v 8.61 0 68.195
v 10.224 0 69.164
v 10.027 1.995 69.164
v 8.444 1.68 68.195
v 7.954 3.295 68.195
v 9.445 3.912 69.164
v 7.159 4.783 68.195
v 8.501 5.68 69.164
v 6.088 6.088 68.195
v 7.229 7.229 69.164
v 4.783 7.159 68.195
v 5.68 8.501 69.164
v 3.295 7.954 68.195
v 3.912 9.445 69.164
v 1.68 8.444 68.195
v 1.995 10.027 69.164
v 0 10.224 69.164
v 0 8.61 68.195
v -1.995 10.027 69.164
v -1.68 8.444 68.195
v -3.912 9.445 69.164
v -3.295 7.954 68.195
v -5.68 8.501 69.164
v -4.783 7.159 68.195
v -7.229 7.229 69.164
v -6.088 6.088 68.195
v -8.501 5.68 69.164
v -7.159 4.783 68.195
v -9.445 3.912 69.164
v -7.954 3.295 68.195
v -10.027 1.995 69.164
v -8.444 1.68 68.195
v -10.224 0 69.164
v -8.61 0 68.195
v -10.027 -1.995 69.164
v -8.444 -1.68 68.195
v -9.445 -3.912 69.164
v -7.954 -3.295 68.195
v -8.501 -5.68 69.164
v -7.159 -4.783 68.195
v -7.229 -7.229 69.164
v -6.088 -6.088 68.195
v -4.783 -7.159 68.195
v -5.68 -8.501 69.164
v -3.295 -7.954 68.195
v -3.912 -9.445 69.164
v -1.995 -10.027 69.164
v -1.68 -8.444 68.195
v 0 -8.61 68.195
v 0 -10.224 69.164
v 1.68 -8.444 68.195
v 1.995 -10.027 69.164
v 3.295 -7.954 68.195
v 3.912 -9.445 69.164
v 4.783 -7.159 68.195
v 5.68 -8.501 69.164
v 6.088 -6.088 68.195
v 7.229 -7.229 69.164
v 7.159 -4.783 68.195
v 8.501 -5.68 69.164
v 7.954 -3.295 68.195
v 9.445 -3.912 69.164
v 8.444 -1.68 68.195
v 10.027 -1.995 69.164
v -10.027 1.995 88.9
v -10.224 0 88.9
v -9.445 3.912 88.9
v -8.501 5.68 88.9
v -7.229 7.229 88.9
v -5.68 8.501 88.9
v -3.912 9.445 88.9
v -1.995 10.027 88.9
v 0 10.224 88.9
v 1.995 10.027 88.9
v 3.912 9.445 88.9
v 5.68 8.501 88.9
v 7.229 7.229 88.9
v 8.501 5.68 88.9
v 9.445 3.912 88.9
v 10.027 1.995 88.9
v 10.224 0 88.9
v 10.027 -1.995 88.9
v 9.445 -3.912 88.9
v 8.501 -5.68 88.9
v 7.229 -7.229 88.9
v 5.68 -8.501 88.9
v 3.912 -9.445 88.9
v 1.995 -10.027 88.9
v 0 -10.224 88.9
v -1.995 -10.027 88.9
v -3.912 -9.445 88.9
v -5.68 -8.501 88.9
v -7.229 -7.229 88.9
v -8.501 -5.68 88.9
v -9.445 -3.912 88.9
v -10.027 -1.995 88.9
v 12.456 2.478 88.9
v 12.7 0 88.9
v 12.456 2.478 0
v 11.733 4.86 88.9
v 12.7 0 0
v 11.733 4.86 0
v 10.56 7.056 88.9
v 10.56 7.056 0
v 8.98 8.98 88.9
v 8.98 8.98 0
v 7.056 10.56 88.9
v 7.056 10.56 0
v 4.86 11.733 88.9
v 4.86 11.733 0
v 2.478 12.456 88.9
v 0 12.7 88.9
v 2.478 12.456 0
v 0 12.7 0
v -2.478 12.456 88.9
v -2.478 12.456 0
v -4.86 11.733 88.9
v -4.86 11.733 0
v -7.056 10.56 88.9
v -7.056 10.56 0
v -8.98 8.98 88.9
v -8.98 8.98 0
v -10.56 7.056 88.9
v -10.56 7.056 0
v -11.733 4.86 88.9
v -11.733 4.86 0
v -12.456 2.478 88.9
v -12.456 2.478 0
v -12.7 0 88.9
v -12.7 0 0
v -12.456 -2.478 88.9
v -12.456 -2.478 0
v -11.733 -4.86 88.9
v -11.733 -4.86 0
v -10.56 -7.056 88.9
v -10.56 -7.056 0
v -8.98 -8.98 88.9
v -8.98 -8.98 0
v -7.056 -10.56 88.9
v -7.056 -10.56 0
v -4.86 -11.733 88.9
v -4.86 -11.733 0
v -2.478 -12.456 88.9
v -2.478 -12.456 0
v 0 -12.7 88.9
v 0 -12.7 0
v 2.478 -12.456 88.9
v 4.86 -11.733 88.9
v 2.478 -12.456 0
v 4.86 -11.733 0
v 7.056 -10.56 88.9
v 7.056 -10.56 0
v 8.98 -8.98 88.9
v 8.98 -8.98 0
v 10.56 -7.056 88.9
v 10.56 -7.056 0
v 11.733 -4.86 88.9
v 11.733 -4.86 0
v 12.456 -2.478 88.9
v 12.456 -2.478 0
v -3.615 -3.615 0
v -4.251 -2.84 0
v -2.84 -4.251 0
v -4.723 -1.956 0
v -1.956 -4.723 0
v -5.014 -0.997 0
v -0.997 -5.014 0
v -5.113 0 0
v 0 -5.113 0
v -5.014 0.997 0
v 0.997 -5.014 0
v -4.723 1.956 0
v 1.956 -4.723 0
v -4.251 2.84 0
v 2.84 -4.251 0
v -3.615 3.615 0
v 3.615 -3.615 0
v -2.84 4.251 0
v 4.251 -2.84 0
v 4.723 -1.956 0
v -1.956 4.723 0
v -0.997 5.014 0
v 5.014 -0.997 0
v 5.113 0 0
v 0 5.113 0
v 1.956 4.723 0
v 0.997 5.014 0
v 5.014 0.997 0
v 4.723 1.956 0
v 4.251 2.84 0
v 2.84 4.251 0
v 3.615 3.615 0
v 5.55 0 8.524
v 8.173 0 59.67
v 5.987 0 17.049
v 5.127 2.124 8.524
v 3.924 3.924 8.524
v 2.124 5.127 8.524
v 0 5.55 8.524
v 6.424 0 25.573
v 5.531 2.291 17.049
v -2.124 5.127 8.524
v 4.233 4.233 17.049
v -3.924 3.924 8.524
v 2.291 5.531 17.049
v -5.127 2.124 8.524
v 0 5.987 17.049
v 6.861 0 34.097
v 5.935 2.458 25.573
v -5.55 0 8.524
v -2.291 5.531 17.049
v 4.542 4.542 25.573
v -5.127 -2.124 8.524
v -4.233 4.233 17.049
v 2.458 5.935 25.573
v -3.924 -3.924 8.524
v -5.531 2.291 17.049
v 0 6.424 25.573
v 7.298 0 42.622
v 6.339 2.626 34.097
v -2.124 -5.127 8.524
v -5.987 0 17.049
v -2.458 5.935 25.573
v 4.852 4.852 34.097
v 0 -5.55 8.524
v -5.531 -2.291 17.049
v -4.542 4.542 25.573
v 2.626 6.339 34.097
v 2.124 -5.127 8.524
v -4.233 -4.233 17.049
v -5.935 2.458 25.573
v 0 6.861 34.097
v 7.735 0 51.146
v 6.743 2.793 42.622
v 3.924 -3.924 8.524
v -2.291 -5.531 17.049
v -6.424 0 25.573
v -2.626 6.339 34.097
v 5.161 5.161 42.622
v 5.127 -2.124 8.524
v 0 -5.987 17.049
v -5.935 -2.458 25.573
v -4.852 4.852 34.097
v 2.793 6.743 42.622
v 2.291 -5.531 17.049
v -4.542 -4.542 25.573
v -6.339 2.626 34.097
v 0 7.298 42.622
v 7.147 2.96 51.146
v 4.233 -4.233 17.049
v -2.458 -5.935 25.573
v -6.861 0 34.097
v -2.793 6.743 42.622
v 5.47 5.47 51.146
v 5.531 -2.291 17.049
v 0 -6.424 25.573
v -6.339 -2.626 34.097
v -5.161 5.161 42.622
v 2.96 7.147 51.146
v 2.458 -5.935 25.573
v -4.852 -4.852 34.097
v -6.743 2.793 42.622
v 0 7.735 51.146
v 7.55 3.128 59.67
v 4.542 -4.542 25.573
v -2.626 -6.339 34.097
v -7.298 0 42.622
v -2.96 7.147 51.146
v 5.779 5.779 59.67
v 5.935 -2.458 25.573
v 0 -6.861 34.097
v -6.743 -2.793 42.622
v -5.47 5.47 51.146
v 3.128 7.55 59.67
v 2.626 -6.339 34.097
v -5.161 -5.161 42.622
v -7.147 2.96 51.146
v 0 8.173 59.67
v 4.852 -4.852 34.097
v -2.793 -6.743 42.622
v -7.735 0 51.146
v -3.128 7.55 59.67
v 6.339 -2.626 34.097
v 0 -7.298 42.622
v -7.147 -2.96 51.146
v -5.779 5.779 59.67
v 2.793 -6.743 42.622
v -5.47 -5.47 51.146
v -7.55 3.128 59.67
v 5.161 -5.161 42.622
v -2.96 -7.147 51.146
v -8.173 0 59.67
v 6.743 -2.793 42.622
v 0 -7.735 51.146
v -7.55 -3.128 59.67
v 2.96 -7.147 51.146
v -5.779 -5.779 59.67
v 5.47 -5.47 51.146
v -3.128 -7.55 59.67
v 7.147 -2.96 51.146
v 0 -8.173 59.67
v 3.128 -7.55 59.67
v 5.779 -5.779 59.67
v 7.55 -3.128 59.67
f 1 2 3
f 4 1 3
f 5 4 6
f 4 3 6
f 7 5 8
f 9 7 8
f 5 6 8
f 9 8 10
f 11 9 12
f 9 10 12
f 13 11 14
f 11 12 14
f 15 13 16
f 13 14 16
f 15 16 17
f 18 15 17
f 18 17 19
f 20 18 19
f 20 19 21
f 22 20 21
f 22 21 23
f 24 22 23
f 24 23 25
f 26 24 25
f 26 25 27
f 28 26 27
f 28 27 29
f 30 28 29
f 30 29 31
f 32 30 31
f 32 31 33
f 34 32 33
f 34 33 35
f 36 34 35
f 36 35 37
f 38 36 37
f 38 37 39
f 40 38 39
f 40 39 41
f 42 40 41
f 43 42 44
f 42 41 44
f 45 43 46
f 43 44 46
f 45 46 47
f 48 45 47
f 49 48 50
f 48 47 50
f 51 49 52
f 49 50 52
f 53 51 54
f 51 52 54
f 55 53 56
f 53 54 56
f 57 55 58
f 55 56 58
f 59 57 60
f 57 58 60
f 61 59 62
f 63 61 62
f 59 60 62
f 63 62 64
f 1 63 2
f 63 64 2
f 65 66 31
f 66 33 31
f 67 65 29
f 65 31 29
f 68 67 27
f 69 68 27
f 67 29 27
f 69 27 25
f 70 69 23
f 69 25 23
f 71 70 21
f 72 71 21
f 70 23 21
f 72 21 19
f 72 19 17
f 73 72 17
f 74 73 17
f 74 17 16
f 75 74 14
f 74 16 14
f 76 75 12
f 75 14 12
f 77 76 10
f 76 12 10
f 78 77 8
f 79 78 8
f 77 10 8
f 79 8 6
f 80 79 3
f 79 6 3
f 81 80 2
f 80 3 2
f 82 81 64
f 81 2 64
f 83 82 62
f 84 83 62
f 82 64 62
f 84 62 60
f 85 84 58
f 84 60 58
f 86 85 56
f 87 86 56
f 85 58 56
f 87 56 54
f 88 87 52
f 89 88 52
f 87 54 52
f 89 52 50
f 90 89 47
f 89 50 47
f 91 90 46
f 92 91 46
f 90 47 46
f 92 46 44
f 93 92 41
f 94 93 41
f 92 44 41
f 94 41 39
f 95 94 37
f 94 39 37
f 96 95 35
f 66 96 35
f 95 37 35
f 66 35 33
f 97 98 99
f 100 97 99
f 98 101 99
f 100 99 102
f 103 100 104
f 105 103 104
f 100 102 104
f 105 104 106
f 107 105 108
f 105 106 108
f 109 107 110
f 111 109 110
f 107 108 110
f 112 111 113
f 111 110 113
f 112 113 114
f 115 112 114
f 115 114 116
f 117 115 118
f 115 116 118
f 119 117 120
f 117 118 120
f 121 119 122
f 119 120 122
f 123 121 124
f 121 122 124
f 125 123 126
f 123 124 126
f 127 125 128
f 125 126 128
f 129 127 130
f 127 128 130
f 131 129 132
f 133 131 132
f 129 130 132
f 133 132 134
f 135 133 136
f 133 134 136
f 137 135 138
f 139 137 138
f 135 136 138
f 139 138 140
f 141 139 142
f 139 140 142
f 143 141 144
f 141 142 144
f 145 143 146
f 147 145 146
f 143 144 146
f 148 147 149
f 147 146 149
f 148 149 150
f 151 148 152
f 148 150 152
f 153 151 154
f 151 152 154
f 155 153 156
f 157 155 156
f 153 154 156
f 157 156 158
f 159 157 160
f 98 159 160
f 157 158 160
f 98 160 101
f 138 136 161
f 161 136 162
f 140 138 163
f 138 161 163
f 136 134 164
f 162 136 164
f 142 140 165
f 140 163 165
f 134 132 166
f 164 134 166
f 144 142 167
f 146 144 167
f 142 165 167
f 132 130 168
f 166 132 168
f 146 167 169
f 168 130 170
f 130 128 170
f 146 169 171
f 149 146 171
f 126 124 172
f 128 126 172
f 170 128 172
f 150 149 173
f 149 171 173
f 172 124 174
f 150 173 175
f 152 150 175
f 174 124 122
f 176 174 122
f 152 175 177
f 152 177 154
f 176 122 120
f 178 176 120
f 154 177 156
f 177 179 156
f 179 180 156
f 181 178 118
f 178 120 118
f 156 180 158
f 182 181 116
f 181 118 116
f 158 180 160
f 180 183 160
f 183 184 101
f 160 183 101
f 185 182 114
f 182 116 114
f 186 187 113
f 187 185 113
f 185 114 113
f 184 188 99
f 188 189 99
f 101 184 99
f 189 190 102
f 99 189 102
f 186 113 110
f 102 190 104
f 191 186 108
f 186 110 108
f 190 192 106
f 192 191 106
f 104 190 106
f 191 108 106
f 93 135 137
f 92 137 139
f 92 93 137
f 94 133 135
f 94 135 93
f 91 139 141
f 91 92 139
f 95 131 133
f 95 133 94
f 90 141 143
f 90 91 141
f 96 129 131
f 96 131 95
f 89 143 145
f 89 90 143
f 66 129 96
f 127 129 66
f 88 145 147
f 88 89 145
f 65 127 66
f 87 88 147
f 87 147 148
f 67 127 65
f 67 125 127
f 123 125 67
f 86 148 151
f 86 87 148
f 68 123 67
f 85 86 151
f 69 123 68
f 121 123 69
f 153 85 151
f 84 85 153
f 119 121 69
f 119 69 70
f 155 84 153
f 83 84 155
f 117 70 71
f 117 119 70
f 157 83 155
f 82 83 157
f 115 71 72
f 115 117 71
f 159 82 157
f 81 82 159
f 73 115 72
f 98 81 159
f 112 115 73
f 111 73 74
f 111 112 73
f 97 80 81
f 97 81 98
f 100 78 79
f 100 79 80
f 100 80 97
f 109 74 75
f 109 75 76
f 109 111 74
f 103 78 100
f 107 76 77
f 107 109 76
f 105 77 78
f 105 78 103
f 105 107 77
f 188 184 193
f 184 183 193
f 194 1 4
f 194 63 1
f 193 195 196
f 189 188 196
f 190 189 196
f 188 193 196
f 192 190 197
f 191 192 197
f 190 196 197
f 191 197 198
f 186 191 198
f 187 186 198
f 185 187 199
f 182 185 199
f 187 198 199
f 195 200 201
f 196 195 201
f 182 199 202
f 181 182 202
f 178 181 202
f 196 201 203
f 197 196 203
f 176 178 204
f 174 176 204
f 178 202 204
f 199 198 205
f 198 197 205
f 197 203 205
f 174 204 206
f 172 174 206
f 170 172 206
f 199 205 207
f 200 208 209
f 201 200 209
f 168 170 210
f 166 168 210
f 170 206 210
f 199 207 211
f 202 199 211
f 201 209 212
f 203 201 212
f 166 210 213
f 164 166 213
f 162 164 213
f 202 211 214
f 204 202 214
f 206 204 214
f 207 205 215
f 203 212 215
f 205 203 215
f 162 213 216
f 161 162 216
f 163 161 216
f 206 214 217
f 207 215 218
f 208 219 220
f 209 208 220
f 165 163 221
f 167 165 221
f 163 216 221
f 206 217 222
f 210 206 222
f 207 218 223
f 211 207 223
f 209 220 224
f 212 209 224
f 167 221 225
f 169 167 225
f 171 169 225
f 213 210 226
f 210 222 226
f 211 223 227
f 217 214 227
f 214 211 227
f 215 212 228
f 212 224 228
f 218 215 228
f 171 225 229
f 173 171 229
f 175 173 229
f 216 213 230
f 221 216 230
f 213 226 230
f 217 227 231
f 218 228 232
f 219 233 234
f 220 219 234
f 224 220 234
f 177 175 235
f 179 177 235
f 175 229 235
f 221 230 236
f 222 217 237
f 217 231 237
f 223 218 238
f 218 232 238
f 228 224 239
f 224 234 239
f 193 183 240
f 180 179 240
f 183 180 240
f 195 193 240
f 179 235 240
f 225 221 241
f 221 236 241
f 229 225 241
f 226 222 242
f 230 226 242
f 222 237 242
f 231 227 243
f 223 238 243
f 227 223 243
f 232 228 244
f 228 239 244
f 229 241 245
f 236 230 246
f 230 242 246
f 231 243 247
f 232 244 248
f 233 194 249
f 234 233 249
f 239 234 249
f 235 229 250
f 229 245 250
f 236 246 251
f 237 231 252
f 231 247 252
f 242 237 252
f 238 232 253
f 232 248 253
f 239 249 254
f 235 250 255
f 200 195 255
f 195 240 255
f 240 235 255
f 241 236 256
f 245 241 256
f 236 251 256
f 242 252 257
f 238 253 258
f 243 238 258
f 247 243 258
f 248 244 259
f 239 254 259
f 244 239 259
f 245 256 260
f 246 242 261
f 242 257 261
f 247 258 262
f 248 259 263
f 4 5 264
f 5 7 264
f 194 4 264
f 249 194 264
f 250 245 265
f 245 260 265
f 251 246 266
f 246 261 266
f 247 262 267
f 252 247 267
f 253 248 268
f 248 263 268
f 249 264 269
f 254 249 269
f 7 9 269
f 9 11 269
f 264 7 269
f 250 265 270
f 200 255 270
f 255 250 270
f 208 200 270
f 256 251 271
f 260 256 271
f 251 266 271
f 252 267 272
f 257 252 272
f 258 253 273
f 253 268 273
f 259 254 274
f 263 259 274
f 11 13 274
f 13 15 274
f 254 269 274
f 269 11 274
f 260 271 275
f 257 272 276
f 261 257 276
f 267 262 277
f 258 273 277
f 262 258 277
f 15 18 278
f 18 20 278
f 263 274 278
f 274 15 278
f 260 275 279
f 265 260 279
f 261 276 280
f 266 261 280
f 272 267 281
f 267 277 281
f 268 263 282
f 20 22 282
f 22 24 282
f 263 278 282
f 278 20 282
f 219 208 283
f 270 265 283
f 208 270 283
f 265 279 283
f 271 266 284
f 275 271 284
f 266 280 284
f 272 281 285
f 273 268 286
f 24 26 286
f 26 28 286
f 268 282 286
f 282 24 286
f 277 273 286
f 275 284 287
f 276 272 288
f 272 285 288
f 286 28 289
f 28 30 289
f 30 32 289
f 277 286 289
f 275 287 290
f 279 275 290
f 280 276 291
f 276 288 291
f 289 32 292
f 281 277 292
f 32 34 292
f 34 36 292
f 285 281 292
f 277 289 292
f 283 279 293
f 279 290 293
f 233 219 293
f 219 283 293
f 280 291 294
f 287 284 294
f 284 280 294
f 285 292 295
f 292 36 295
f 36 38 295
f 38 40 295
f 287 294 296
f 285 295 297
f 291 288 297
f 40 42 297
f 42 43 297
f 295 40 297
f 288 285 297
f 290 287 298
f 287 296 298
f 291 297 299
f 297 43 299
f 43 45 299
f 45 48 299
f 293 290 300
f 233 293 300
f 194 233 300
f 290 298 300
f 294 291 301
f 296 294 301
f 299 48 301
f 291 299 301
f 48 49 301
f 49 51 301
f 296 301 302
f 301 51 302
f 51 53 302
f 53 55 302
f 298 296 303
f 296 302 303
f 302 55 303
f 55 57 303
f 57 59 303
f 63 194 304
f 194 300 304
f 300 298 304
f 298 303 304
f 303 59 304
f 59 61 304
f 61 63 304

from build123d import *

# Parameters (mm, degrees)
F0_R     = 12.7
F1_DEPTH = 73.66
F2_R     = 5.1125641025
F3_DEPTH = 73.661
F3_TAPER = -2.9356734464
F4_R     = 12.7
F5_DEPTH = 15.24
F8_D     = 20.447
F8_DEPTH = 19.7358
F8_TIP   = 6.1428985386


with BuildPart() as f1:
    # F0 (on Top) → F1 (new body)
    with BuildSketch(Plane.XY):
        Circle(F0_R)
    extrude(amount=F1_DEPTH)

    # F2 (on Top) → F3 (cut, through all)
    with BuildSketch(Plane.XY):
        Circle(F2_R)
    extrude(amount=F3_DEPTH, taper=F3_TAPER, mode=Mode.SUBTRACT)

    # F4 (on face) → F5 (join)
    with BuildSketch(Plane.XY.offset(73.66)):
        Circle(F4_R)
    extrude(amount=F5_DEPTH)

    # F8
    with Locations(Plane.XY.offset(88.9)):
        with Locations((0, 0)):
            Hole(F8_D / 2, depth=F8_DEPTH)
            with Locations((0, 0, -(F8_DEPTH + F8_TIP / 2))):  # 118° drill point
                Cone(0, F8_D / 2, F8_TIP, mode=Mode.SUBTRACT)


solid = f1.part
